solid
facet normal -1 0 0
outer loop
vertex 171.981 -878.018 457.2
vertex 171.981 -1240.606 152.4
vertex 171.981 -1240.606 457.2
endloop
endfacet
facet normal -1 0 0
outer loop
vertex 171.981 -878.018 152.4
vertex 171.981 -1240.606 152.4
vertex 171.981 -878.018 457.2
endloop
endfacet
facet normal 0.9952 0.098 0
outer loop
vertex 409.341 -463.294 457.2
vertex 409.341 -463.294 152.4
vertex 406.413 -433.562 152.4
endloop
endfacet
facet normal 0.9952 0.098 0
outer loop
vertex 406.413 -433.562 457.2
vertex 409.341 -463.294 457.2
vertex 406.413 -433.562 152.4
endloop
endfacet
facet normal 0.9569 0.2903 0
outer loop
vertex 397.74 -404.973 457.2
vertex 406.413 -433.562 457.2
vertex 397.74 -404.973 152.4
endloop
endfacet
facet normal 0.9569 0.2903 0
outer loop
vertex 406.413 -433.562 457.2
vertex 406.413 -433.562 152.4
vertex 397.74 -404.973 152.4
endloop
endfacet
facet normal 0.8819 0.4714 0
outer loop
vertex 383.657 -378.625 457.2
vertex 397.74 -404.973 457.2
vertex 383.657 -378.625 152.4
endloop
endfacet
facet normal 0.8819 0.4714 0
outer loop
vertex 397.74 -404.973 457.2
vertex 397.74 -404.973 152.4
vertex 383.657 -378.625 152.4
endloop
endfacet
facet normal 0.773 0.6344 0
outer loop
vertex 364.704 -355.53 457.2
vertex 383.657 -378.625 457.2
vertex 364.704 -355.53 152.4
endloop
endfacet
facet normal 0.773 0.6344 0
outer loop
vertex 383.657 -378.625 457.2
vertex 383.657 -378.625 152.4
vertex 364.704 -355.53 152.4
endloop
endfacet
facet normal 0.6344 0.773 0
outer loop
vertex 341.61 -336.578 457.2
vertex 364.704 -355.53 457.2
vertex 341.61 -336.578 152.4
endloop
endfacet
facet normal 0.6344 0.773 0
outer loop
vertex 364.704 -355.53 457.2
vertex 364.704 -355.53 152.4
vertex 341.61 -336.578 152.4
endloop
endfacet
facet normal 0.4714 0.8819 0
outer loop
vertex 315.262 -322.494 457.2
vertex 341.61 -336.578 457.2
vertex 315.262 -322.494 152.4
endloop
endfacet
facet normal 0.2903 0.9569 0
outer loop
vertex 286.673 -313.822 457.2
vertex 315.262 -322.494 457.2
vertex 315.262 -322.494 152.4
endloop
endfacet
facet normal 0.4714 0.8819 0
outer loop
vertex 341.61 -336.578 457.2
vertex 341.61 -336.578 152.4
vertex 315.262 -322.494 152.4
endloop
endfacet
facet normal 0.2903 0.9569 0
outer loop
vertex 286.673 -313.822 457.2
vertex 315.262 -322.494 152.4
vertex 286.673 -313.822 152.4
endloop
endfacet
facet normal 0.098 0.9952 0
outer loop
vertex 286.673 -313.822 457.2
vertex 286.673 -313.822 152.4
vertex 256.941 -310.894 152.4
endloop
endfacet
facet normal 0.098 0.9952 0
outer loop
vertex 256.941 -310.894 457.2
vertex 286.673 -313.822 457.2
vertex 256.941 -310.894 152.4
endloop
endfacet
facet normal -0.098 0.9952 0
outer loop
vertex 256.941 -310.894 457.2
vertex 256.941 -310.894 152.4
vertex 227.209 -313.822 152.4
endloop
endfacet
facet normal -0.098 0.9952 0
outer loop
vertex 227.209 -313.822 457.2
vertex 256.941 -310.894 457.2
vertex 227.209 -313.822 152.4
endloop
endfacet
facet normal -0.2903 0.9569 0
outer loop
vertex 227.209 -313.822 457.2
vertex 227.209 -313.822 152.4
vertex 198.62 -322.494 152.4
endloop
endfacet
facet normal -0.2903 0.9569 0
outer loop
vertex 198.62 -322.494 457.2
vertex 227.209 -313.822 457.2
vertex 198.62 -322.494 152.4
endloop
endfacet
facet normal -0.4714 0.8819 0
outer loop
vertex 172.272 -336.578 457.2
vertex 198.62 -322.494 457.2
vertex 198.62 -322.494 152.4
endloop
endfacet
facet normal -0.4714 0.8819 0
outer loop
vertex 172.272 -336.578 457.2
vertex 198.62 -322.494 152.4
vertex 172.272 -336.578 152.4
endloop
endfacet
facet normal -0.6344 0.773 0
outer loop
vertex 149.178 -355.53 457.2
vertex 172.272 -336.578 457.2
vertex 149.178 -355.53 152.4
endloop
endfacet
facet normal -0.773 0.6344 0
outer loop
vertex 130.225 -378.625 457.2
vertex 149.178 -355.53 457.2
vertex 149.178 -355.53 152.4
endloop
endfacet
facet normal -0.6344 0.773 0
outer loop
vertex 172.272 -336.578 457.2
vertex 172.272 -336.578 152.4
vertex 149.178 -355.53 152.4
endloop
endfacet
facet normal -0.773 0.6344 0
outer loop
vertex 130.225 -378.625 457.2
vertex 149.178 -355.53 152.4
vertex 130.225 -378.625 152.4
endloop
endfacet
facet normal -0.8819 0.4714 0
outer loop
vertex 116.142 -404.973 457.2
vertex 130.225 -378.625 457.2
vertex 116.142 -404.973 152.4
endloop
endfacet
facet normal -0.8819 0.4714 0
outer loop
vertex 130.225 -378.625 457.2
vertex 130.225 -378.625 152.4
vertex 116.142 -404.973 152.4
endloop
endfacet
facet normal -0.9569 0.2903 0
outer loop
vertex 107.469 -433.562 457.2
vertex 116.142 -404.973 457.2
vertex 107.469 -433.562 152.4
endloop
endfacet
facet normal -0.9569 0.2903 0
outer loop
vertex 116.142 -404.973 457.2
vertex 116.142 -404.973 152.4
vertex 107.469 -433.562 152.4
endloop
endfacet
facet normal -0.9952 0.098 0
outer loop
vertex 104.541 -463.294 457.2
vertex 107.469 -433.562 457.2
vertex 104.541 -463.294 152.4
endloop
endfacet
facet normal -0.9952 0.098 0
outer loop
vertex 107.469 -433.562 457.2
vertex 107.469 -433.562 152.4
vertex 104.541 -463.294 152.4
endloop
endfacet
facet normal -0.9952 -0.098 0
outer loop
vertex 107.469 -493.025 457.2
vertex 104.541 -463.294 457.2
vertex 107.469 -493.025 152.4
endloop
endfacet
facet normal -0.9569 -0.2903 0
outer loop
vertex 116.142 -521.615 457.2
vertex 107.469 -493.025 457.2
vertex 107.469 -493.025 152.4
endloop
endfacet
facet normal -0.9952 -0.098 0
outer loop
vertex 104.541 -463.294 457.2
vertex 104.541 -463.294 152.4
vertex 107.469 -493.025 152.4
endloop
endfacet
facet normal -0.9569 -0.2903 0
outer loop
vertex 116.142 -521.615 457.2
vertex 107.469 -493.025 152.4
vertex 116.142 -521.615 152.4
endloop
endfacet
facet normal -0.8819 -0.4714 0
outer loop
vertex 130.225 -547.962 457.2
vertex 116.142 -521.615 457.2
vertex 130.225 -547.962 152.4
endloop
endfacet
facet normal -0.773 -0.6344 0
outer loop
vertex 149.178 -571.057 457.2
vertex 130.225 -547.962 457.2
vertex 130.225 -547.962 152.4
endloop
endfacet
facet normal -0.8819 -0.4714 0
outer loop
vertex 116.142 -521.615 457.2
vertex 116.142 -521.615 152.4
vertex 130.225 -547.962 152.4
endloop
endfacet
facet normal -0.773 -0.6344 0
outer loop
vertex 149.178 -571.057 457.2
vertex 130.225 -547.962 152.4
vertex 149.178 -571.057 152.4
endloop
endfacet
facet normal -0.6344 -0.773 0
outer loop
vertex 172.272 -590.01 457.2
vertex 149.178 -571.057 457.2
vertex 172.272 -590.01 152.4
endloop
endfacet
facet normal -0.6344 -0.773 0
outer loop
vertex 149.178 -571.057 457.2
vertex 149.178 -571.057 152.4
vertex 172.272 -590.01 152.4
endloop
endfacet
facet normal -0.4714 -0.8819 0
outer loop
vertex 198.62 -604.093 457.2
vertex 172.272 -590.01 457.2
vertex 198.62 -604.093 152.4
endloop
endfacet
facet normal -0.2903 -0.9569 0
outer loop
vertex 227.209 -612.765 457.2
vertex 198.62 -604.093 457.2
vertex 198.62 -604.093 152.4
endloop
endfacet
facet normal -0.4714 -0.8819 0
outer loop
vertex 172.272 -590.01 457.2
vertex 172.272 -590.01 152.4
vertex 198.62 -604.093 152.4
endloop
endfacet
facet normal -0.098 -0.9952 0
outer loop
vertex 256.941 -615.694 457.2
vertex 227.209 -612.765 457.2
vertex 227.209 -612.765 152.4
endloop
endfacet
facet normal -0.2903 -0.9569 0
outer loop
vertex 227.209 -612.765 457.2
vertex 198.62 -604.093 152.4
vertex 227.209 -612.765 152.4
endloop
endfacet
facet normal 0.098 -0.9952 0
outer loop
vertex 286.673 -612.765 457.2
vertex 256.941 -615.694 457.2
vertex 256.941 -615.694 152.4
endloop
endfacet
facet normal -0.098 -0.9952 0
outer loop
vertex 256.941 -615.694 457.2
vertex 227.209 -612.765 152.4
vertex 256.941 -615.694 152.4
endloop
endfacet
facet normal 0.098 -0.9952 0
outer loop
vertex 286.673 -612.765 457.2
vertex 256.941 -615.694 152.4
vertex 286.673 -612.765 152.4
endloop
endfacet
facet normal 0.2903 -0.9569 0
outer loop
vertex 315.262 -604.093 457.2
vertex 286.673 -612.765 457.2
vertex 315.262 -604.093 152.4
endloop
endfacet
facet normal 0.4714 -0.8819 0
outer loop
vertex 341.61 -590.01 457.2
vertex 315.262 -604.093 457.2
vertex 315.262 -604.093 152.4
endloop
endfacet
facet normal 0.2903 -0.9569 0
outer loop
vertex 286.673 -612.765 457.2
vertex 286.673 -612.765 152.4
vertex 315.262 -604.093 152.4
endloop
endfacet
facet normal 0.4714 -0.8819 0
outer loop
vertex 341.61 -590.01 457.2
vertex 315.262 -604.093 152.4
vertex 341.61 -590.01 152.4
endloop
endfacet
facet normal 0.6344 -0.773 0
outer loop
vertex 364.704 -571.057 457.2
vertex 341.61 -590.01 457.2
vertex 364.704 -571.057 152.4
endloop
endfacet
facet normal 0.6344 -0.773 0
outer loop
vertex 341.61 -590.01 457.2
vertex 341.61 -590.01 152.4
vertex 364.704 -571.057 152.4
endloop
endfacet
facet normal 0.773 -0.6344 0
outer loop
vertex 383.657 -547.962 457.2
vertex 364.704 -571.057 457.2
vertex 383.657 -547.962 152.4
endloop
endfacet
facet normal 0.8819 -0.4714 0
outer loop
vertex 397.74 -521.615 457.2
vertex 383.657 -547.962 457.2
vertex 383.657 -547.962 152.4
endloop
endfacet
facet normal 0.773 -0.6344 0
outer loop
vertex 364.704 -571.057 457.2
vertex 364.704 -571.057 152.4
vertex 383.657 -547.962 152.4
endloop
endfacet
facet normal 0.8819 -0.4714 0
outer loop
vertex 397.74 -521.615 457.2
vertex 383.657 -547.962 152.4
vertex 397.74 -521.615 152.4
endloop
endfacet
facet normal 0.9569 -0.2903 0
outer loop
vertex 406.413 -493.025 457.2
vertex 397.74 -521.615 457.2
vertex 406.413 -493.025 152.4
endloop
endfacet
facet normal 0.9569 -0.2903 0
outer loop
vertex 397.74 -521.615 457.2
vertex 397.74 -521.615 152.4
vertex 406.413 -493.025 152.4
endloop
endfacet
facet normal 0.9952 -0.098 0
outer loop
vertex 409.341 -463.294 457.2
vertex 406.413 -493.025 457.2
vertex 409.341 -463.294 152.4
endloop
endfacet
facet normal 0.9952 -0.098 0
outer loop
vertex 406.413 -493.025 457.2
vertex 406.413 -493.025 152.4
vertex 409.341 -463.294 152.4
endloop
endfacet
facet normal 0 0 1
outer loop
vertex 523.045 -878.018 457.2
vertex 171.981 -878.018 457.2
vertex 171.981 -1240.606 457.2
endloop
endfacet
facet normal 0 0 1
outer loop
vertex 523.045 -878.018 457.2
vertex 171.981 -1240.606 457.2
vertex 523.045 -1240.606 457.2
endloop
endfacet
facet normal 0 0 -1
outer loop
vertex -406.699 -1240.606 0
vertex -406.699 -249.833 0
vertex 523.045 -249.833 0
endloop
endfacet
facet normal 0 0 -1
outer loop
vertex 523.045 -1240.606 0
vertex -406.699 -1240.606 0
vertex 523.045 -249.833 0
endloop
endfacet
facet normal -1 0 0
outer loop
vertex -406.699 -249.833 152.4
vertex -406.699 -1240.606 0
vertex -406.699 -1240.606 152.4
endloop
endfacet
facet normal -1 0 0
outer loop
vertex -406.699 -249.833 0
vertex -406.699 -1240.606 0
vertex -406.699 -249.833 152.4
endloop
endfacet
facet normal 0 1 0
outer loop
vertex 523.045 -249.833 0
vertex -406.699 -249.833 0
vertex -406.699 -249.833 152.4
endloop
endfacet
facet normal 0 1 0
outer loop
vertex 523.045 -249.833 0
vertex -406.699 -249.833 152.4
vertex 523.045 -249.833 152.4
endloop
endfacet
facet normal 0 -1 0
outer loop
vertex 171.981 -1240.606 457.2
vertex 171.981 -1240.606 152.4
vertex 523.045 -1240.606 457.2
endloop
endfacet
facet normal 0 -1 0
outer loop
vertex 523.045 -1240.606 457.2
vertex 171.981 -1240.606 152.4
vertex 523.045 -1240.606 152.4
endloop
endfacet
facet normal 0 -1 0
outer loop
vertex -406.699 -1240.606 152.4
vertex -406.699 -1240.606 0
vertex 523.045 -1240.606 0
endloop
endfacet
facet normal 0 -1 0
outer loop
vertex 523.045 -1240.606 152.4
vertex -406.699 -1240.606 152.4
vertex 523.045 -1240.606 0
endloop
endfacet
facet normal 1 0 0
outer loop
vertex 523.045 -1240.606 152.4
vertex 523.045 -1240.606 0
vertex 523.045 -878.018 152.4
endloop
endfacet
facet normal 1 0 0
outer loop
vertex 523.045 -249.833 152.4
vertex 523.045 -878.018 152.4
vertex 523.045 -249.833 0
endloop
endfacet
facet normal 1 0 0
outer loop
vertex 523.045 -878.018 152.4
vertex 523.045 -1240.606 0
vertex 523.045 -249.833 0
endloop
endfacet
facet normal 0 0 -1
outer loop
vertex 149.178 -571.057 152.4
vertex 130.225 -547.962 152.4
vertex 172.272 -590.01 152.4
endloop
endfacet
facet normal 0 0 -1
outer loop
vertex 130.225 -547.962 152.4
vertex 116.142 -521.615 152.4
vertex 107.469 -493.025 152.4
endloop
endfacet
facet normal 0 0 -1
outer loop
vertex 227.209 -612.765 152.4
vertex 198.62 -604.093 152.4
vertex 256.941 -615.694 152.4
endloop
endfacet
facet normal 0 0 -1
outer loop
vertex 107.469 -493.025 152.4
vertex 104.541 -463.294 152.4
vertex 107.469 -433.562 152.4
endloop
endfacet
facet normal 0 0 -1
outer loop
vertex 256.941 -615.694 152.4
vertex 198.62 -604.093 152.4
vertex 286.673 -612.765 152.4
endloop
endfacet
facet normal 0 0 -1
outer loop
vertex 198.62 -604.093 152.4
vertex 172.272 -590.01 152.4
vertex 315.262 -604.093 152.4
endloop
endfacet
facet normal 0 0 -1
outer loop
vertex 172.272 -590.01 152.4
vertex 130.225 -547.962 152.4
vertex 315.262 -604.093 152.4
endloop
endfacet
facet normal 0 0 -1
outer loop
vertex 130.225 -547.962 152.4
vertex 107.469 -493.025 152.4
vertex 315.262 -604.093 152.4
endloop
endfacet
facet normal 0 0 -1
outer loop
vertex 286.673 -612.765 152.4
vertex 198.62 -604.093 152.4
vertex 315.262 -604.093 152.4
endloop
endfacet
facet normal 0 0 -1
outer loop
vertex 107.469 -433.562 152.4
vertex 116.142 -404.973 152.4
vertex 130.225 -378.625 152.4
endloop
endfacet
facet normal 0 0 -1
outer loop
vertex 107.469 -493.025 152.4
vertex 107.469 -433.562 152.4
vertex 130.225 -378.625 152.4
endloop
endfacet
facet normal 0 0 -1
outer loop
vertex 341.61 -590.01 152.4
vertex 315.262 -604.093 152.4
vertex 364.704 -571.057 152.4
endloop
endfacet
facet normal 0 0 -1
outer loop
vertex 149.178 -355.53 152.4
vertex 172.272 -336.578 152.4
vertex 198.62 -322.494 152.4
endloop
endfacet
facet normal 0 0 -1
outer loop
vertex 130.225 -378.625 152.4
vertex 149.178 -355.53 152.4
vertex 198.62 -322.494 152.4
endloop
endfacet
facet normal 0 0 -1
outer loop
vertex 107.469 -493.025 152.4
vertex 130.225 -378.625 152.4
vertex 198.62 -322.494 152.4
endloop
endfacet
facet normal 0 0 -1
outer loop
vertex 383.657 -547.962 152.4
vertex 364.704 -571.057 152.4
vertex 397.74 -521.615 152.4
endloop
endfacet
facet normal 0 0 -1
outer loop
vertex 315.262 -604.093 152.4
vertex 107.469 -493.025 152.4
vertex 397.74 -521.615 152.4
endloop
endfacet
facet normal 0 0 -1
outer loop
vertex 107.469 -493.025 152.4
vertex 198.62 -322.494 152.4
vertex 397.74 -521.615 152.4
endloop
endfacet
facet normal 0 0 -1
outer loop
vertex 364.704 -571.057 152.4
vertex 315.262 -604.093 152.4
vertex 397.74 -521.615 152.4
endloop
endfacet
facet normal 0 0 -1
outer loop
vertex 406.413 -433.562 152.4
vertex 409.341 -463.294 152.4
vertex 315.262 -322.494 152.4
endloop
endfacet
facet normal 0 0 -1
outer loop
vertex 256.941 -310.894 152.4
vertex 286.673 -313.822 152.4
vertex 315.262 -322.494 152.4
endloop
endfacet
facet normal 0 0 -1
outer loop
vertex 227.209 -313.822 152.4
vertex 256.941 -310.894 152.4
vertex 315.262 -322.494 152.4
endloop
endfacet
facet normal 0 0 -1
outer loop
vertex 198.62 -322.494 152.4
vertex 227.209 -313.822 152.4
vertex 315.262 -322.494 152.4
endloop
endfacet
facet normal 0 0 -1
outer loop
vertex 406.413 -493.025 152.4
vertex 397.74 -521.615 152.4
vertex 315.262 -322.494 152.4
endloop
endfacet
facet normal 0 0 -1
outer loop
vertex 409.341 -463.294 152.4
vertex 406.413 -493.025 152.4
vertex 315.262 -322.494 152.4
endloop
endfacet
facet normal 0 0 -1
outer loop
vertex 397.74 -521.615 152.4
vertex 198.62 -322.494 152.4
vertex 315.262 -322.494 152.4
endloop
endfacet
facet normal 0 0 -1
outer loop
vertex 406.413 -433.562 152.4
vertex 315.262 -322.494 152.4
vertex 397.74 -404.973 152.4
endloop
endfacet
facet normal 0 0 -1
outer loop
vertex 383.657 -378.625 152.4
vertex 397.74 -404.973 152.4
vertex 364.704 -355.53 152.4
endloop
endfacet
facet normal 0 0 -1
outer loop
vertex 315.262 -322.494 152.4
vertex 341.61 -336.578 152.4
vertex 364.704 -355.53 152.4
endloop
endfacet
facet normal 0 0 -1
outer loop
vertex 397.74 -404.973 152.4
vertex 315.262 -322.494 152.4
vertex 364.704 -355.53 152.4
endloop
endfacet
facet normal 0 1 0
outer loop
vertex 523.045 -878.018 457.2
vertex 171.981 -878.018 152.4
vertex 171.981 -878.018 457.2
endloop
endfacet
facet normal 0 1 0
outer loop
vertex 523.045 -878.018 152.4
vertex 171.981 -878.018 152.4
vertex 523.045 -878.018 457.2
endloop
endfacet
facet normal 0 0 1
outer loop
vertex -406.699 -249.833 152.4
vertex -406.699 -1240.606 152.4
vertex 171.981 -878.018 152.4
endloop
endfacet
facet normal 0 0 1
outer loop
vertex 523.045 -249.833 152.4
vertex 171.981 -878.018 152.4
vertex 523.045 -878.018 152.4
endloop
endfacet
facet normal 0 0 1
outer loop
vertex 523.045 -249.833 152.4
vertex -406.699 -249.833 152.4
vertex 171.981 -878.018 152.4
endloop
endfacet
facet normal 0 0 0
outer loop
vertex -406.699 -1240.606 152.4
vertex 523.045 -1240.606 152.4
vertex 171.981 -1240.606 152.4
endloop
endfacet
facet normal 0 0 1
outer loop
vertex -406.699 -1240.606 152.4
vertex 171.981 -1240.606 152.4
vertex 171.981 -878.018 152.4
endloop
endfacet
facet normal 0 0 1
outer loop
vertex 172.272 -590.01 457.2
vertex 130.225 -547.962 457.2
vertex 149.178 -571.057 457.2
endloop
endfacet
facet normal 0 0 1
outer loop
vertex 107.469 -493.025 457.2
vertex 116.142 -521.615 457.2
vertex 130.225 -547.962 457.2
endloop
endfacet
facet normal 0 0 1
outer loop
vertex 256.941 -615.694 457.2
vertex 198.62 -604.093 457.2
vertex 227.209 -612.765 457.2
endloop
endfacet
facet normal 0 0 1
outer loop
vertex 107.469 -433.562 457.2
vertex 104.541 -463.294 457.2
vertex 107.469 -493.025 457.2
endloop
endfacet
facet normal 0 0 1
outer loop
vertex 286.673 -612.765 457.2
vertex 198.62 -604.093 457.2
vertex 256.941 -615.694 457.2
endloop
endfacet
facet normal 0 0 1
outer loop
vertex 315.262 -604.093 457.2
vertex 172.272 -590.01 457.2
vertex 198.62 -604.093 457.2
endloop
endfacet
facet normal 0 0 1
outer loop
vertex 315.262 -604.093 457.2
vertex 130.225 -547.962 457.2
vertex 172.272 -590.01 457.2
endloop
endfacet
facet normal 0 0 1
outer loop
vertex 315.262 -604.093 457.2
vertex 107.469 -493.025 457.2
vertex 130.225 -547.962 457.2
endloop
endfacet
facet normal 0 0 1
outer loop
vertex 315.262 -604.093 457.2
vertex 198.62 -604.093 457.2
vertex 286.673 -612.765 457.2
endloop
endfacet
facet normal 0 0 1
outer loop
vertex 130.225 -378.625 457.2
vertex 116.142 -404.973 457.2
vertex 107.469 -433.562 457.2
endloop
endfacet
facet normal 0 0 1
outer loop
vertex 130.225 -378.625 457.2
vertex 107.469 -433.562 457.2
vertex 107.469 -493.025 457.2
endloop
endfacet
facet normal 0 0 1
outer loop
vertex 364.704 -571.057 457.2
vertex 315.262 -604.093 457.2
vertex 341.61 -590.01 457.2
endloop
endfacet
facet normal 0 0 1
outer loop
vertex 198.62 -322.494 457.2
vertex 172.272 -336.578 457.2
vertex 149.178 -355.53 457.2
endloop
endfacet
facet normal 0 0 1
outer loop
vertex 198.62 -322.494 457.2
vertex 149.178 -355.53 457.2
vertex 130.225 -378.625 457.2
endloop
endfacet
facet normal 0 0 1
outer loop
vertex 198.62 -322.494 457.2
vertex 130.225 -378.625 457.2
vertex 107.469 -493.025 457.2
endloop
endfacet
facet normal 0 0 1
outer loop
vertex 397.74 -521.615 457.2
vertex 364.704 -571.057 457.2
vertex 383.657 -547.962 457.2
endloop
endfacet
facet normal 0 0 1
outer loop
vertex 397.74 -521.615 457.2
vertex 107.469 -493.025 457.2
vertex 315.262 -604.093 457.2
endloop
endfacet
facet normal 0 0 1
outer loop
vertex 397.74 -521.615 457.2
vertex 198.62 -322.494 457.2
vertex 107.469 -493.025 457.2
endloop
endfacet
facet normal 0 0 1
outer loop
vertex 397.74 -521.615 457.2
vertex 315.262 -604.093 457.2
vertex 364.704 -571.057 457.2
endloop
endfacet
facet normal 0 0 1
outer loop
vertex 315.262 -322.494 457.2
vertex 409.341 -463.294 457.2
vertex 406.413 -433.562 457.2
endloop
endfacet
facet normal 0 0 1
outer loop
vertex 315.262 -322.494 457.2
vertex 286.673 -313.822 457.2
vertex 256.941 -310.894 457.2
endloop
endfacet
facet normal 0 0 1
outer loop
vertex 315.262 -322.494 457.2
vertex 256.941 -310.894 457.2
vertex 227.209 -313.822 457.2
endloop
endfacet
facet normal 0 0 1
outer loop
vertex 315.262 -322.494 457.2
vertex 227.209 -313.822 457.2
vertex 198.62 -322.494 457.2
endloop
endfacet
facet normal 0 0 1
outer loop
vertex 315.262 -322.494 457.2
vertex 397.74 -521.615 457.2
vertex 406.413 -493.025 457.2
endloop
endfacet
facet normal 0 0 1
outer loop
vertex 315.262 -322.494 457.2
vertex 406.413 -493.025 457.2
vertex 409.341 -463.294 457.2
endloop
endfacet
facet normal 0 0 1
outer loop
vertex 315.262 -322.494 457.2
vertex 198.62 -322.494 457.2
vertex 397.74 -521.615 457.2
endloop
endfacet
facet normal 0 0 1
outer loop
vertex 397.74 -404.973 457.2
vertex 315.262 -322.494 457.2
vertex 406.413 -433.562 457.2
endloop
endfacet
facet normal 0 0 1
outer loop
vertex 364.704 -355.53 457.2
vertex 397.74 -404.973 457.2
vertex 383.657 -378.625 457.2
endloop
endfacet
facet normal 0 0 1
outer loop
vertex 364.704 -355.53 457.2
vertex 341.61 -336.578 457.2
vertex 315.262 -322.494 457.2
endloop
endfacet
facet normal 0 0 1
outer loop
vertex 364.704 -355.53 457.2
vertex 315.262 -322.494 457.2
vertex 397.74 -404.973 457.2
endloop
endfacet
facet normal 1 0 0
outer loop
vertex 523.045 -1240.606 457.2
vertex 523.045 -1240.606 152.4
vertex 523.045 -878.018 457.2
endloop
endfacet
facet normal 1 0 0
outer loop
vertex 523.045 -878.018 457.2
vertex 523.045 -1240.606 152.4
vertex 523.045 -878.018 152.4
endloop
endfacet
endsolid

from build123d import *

# Parameters (mm, degrees)
F0_W     = 929.743558
F0_H     = 990.773723
F1_DEPTH = 152.4
F2_R     = 152.4
F3_DEPTH = 304.8
F4_W     = 351.064283
F4_H     = 362.588108
F5_DEPTH = 304.8


with BuildPart() as f1:
    # F0 (on Top) → F1 (new body)
    with BuildSketch(Plane.XY):
        with Locations((58.173105, -745.219447)):
            Rectangle(F0_W, F0_H)
    extrude(amount=F1_DEPTH)

    # F4 (on face) → F5 (join)
    with BuildSketch(Plane.XY.offset(152.4)):
        with Locations((347.512743, -1059.312254)):
            Rectangle(F4_W, F4_H)
    extrude(amount=F5_DEPTH)


with BuildPart() as f3:
    # F2 (on face) → F3 (new body)
    with BuildSketch(Plane.XY.offset(152.4)):
        with Locations((256.940961, -463.293552)):
            Circle(F2_R)
    extrude(amount=F3_DEPTH)


solid = Compound([f1.part, f3.part])
